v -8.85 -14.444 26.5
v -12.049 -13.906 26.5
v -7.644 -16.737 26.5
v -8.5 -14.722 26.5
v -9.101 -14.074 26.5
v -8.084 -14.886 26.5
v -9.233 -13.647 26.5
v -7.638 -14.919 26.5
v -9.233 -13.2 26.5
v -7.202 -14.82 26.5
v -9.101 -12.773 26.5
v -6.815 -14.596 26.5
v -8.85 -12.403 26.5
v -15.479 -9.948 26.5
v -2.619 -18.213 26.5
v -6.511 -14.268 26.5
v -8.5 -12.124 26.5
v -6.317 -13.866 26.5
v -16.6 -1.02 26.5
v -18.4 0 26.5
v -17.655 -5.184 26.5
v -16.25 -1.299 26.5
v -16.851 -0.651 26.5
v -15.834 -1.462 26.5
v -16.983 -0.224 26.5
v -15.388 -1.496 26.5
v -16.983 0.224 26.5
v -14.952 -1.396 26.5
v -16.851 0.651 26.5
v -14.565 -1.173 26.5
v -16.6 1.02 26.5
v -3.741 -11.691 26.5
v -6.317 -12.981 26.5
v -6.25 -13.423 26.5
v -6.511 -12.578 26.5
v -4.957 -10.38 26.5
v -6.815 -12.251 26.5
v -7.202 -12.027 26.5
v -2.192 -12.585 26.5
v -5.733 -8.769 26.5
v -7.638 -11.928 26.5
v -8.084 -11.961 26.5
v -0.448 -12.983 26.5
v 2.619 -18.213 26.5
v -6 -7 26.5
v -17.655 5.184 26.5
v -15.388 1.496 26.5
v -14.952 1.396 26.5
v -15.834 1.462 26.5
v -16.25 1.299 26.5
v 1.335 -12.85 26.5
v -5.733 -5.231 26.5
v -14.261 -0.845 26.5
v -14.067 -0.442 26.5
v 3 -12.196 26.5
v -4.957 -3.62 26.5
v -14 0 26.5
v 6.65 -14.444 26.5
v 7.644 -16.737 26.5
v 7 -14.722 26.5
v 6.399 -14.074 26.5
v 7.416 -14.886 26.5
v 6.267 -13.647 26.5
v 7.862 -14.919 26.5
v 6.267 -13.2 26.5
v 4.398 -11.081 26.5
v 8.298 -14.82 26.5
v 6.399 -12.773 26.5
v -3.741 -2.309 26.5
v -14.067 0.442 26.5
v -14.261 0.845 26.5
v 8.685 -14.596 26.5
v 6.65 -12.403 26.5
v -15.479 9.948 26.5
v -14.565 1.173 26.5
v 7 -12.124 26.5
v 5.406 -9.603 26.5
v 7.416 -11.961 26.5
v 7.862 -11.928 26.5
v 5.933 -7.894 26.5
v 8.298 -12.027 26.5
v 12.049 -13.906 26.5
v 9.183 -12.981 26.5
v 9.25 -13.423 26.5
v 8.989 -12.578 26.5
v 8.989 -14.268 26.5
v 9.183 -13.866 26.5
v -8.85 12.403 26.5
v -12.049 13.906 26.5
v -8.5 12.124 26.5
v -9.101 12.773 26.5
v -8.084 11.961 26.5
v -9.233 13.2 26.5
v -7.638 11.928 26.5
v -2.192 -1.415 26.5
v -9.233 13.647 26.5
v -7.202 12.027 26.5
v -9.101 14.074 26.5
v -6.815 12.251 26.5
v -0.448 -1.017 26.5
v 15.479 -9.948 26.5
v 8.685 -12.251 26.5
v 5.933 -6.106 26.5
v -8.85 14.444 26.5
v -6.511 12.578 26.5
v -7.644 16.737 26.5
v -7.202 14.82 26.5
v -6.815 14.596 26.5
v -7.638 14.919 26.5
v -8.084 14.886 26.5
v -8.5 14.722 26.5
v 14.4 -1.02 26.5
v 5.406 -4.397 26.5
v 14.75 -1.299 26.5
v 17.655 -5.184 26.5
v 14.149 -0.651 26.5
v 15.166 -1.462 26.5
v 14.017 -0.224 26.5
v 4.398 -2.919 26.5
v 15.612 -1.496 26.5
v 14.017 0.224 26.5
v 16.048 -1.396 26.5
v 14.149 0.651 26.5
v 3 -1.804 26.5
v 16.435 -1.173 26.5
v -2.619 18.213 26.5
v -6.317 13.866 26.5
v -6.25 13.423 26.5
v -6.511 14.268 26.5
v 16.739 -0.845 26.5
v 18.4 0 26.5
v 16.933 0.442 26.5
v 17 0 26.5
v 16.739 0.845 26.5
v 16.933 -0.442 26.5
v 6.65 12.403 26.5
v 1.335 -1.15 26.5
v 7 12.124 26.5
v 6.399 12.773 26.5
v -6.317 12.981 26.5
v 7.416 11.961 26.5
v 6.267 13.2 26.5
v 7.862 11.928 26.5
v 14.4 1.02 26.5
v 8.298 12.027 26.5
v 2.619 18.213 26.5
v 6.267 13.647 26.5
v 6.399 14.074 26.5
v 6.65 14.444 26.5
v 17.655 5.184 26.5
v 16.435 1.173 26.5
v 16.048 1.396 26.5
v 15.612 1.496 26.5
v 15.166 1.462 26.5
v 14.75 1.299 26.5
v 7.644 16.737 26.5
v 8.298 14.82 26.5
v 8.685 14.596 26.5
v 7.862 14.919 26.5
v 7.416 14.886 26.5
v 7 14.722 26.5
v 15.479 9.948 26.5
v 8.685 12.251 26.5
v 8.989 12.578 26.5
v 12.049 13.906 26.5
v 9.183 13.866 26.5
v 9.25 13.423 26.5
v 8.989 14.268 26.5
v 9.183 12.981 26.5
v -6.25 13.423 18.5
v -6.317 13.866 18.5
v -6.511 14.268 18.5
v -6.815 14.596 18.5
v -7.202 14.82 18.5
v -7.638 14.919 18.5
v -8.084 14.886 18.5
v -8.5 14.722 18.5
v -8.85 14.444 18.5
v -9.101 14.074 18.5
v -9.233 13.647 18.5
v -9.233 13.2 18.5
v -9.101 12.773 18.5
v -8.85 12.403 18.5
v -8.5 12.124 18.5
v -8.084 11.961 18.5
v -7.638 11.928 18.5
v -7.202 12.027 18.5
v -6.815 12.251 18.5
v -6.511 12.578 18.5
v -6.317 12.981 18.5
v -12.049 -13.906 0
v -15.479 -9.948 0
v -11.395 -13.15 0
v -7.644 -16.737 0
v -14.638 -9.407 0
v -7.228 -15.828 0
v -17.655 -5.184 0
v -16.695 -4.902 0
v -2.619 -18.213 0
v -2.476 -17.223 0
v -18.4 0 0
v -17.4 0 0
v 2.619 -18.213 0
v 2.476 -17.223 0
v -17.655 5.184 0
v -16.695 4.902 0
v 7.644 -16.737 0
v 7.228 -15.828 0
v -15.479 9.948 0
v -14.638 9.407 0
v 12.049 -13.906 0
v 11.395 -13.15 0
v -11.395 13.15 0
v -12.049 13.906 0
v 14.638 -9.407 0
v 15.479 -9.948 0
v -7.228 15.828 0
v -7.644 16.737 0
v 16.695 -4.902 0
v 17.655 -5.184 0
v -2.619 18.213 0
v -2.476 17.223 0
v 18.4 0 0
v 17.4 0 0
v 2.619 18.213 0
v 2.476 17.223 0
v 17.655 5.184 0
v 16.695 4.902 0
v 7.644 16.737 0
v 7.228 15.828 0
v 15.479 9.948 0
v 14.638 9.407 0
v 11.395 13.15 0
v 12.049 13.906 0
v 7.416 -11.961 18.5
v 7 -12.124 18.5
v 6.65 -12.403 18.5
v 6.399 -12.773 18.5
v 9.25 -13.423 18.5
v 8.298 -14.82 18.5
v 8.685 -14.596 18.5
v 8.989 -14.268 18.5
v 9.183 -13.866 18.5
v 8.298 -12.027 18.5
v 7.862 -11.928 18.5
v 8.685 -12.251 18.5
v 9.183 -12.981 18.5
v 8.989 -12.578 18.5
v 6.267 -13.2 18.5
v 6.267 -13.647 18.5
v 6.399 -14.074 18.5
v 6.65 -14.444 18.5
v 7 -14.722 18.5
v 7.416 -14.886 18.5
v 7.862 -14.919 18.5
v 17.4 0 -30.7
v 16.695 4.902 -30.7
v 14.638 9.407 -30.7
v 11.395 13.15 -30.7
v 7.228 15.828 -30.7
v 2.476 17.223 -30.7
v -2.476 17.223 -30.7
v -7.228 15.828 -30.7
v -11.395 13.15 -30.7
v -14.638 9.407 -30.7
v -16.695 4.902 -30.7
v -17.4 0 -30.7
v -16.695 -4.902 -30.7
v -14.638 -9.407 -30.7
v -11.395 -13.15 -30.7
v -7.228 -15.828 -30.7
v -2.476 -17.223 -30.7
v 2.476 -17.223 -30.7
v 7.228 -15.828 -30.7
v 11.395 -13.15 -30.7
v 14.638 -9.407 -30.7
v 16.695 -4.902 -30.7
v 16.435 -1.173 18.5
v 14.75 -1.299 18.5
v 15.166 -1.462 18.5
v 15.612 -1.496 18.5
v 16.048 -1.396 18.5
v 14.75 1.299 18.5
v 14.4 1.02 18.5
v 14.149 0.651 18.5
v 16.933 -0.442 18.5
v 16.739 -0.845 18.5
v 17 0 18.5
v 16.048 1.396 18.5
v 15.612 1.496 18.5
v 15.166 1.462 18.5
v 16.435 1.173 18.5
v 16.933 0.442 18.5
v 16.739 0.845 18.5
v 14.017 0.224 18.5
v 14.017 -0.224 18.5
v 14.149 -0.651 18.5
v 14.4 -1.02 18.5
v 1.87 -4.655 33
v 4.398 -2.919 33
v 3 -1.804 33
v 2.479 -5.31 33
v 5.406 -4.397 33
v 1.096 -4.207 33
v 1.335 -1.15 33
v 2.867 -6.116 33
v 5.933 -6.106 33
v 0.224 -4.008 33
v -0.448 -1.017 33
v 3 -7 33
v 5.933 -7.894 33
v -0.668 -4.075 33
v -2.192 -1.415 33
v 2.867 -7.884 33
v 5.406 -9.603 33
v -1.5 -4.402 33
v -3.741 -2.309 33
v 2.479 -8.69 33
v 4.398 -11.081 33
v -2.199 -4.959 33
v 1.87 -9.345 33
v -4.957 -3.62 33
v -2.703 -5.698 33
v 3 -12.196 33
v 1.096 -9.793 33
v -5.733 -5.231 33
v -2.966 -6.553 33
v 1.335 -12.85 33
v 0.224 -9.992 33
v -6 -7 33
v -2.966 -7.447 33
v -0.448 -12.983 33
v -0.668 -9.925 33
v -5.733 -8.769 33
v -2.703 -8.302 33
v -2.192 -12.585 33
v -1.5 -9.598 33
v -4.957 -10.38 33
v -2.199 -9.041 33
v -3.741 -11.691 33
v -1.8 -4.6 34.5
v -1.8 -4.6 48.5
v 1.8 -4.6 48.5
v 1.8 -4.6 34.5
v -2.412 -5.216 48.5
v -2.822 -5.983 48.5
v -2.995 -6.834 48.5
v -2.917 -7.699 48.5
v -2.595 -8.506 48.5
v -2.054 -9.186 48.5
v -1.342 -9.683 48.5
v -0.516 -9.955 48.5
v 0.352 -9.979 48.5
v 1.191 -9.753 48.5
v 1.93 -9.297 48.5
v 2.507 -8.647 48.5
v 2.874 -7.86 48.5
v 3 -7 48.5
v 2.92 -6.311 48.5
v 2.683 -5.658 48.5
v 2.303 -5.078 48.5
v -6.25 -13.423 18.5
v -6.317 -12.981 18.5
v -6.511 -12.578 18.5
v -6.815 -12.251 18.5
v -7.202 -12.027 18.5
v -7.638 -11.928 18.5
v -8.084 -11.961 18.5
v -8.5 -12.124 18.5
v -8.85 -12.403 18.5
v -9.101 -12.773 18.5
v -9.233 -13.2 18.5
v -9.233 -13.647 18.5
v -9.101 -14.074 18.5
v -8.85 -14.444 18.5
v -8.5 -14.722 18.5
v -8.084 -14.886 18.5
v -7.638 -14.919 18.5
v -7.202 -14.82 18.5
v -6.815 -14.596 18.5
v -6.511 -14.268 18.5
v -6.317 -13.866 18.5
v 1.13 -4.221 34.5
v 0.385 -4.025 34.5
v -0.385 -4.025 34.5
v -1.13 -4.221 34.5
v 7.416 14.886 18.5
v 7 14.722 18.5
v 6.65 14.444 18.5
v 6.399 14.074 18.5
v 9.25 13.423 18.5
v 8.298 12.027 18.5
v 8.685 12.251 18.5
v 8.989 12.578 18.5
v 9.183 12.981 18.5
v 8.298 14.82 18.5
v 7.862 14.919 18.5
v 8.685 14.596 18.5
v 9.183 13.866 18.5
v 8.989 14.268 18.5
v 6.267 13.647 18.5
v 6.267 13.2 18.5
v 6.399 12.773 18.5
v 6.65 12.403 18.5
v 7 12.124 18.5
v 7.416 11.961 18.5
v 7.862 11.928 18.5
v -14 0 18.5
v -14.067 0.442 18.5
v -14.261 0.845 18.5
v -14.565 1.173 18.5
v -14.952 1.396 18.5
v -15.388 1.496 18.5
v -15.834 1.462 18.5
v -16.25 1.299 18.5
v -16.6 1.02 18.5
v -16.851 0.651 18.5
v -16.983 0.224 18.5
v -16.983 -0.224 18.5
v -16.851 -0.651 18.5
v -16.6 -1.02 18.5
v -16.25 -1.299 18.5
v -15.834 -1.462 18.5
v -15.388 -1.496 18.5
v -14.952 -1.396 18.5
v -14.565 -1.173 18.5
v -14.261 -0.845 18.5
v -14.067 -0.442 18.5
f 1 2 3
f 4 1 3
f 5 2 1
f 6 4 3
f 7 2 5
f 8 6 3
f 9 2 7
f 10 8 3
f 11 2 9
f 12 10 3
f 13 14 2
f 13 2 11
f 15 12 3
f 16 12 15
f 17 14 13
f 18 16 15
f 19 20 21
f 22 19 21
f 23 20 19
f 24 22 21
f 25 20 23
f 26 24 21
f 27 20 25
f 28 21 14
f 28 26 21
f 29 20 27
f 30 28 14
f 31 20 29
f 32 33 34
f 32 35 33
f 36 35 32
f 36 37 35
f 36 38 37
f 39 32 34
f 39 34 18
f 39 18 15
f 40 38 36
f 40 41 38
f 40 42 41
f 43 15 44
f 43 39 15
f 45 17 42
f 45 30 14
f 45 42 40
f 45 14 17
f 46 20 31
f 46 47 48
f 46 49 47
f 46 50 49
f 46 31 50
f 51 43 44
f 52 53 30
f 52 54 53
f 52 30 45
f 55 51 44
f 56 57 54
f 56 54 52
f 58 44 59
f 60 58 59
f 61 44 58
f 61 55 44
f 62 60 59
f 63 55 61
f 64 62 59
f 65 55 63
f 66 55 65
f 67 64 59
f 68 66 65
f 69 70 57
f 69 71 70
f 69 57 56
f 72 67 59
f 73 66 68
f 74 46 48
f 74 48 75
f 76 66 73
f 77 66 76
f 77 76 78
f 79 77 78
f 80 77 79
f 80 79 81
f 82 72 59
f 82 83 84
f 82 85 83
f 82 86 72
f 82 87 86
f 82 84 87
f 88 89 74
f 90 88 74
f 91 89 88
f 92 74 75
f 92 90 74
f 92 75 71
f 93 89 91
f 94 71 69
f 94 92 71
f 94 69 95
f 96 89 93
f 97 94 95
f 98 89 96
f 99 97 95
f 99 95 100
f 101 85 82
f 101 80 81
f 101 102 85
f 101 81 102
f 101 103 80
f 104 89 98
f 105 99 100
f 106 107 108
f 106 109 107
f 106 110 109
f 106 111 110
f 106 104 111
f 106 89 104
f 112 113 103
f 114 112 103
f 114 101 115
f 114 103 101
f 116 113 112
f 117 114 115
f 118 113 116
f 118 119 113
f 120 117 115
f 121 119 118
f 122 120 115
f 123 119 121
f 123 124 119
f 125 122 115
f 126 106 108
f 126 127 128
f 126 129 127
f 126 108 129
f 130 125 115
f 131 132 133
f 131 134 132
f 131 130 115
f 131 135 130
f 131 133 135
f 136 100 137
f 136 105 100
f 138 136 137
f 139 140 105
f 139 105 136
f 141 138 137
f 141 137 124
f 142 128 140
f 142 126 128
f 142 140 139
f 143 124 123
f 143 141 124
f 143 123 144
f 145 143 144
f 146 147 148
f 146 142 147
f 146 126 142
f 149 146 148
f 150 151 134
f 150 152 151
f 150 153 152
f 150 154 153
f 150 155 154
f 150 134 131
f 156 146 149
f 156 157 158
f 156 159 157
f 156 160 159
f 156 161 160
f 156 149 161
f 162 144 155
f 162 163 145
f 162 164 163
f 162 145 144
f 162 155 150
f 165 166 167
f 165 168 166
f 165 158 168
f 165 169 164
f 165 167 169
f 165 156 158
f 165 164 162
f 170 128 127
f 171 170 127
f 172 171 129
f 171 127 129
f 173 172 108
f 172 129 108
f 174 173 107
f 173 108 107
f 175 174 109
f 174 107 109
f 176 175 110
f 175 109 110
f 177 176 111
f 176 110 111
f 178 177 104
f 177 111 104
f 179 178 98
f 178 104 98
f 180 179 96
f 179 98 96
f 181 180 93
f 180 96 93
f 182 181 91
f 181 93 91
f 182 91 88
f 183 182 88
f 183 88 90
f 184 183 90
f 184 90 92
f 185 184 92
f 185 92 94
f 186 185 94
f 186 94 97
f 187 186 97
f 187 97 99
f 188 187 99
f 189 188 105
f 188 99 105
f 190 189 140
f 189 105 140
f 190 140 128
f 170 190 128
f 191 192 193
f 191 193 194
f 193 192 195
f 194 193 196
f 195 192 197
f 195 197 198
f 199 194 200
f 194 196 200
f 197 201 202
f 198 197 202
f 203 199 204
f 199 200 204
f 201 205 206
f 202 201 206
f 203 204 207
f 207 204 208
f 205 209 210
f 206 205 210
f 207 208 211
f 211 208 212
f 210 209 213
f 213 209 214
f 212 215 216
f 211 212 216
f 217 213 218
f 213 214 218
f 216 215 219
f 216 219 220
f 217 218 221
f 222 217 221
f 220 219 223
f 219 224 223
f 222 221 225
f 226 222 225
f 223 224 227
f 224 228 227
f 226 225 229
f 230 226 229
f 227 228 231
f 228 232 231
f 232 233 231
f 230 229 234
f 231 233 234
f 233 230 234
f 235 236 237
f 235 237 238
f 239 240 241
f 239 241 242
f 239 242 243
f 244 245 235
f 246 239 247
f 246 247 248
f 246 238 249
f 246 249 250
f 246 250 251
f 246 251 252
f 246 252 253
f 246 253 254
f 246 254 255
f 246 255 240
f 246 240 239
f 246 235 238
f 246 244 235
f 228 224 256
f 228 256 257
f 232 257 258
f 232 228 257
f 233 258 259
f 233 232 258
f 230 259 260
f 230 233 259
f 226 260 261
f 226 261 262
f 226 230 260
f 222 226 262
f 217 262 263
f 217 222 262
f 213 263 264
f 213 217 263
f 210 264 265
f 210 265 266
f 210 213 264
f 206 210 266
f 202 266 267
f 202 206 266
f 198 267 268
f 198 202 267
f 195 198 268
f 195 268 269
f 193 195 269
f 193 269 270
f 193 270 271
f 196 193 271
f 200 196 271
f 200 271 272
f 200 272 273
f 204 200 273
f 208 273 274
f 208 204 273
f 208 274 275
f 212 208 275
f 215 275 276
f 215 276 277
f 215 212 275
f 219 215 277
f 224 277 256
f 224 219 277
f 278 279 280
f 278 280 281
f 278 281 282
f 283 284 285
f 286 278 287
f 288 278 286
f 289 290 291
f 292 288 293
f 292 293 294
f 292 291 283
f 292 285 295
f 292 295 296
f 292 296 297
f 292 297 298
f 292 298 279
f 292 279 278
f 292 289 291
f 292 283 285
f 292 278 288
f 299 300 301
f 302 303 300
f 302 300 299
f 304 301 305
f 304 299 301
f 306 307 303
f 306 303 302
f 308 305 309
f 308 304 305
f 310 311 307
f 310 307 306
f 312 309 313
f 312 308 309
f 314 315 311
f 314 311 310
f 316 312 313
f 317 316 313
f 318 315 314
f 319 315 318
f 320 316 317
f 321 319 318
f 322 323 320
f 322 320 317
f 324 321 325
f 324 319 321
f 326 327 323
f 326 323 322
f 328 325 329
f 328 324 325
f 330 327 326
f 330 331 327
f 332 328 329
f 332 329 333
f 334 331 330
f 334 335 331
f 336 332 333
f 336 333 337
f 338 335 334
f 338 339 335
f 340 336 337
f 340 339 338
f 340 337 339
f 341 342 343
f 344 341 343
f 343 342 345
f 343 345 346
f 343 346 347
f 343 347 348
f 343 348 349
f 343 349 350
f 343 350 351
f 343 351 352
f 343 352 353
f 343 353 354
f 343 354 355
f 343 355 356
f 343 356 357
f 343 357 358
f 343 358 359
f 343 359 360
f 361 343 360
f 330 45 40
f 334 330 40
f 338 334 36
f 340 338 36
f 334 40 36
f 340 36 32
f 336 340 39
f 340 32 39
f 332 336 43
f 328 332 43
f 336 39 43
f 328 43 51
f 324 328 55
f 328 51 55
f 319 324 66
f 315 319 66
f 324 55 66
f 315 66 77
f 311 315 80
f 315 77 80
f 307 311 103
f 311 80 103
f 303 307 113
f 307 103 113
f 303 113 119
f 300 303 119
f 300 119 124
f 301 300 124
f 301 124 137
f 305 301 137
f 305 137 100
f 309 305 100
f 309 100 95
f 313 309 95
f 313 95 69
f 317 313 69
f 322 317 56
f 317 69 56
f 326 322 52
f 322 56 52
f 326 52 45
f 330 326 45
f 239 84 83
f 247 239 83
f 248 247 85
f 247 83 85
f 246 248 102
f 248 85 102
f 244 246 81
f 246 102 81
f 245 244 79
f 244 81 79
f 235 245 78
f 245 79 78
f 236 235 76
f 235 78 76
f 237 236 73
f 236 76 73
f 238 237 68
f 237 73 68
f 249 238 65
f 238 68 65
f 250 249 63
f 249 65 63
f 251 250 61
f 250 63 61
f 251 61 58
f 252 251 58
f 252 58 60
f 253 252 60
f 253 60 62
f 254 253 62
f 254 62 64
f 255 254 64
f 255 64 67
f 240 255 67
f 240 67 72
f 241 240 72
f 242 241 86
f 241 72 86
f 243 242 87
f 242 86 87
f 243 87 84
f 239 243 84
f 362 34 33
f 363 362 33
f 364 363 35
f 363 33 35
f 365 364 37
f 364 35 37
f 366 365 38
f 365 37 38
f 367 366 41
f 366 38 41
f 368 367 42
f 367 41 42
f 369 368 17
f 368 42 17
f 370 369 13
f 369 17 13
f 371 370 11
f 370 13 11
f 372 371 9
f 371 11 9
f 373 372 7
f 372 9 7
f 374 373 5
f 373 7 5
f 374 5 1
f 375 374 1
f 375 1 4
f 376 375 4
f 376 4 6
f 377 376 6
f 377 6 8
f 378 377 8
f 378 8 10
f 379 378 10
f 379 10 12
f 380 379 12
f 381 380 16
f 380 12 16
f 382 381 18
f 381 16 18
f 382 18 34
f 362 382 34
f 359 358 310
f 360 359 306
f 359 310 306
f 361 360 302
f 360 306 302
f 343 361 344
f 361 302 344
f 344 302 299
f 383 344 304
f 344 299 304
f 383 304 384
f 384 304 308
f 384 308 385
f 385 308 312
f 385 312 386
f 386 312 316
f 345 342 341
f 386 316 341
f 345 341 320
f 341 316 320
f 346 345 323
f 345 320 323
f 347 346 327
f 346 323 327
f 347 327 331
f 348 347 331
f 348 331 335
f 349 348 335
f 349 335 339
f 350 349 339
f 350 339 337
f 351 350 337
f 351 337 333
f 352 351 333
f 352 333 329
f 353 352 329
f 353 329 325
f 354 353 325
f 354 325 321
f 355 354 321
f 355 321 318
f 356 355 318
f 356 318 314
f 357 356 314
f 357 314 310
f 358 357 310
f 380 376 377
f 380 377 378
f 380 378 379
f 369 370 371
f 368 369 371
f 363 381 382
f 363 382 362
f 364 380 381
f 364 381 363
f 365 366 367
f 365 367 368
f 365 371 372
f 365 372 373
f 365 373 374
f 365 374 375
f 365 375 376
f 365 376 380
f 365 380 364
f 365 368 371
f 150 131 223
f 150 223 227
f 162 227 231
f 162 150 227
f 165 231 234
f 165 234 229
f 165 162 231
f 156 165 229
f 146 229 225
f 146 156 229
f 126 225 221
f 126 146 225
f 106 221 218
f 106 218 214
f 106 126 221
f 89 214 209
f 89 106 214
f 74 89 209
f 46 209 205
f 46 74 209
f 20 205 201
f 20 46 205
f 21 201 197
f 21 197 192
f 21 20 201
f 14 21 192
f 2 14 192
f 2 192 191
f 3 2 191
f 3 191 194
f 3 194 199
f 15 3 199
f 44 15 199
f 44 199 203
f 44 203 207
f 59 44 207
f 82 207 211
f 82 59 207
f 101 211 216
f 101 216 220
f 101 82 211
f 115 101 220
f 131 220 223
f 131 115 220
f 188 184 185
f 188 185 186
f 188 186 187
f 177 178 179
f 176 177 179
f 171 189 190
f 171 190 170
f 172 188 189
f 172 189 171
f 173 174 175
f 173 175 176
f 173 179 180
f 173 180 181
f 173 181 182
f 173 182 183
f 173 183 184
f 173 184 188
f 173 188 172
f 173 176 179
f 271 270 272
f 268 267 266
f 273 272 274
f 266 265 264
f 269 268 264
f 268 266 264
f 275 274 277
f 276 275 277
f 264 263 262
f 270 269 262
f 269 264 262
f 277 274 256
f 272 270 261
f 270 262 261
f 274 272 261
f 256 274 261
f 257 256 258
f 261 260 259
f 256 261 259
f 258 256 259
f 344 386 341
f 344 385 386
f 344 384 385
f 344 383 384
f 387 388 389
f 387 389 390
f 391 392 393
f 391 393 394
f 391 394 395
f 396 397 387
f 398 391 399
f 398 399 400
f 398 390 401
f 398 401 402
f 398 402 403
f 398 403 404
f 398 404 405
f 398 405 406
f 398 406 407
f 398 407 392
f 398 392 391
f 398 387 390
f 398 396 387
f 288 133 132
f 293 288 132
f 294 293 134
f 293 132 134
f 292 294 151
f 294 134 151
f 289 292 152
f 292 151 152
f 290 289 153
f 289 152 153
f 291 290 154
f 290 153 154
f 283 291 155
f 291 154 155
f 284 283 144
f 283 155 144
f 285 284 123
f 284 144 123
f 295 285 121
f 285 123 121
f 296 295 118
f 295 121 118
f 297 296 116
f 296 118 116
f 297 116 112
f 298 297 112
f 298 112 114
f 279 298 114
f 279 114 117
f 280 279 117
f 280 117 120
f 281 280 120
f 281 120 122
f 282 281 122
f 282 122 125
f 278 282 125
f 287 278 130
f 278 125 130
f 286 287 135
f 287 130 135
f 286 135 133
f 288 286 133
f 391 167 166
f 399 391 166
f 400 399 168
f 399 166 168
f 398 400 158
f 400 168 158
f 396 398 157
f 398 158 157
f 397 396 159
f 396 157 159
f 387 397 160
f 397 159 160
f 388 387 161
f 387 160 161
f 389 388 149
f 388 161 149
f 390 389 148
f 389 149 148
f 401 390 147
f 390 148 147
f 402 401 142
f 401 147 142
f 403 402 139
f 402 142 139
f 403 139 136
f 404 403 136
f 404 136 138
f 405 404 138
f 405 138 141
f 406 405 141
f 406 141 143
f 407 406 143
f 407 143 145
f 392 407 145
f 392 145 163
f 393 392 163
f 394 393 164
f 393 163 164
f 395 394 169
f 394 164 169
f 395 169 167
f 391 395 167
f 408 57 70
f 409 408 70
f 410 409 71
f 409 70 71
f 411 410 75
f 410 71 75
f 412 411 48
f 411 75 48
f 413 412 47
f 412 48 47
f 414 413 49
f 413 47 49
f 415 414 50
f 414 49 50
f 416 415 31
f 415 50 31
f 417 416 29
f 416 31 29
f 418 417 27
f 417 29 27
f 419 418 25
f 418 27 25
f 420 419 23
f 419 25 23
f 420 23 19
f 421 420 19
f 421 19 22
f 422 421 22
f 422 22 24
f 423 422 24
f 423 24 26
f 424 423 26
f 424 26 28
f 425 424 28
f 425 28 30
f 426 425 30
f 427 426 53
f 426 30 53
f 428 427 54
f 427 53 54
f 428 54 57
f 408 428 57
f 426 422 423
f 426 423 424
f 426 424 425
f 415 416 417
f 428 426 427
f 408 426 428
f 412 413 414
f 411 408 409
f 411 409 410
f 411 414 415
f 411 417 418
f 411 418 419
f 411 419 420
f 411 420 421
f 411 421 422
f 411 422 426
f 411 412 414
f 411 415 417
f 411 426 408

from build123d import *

# Parameters (mm, degrees)
SKETCH1_R           = 18.4
BOSS_EXTRUDE1_DEPTH = 26.5
SKETCH2_R           = 17.4
BOSS_EXTRUDE2_DEPTH = 30.7
SKETCH3_R           = 6
BOSS_EXTRUDE3_DEPTH = 6.5
SKETCH4_R           = 3
BOSS_EXTRUDE4_DEPTH = 15.5
CUT_EXTRUDE1_DEPTH  = 14
SKETCH6_R           = 1.5
CUT_EXTRUDE2_DEPTH  = 8


with BuildPart() as part:
    # Sketch1 → Boss-Extrude1 (new body)
    with BuildSketch(Plane.XY.offset(26.5)):
        Circle(SKETCH1_R)
    extrude(amount=-BOSS_EXTRUDE1_DEPTH)

    # Sketch2 → Boss-Extrude2 (add)
    with BuildSketch(Plane.XY):
        Circle(SKETCH2_R)
    extrude(amount=-BOSS_EXTRUDE2_DEPTH)

    # Sketch3 → Boss-Extrude3 (add)
    with BuildSketch(Plane.XY.offset(26.5)):
        with Locations(Location((0, -7, 0), (0, 0, 180))):
            Circle(SKETCH3_R)
    extrude(amount=BOSS_EXTRUDE3_DEPTH)

    # Sketch4 → Boss-Extrude4 (add)
    with BuildSketch(Plane.XY.offset(33)):
        with Locations((0, -7)):
            Circle(SKETCH4_R)
    extrude(amount=BOSS_EXTRUDE4_DEPTH)

    # Sketch5 → Cut-Extrude1 (cut)
    with BuildSketch(Plane.XY.offset(48.5)):
        Polygon((-4.411433232, -4.6), (4.412869288, -4.6), (0, -0.417886065), align=None)
    extrude(amount=-CUT_EXTRUDE1_DEPTH, mode=Mode.SUBTRACT)

    # Sketch6 → Cut-Extrude2 (cut)
    with BuildSketch(Plane.XY.offset(26.5)):
        with Locations((-15.5, 0)):
            Circle(SKETCH6_R)
        with Locations((-7.75, 13.423393759)):
            Circle(SKETCH6_R)
        with Locations((7.75, 13.423393759)):
            Circle(SKETCH6_R)
        with Locations((15.5, 0)):
            Circle(SKETCH6_R)
        with Locations((7.75, -13.423393759)):
            Circle(SKETCH6_R)
        with Locations((-7.75, -13.423393759)):
            Circle(SKETCH6_R)
    extrude(amount=-CUT_EXTRUDE2_DEPTH, mode=Mode.SUBTRACT)


solid = part.part
